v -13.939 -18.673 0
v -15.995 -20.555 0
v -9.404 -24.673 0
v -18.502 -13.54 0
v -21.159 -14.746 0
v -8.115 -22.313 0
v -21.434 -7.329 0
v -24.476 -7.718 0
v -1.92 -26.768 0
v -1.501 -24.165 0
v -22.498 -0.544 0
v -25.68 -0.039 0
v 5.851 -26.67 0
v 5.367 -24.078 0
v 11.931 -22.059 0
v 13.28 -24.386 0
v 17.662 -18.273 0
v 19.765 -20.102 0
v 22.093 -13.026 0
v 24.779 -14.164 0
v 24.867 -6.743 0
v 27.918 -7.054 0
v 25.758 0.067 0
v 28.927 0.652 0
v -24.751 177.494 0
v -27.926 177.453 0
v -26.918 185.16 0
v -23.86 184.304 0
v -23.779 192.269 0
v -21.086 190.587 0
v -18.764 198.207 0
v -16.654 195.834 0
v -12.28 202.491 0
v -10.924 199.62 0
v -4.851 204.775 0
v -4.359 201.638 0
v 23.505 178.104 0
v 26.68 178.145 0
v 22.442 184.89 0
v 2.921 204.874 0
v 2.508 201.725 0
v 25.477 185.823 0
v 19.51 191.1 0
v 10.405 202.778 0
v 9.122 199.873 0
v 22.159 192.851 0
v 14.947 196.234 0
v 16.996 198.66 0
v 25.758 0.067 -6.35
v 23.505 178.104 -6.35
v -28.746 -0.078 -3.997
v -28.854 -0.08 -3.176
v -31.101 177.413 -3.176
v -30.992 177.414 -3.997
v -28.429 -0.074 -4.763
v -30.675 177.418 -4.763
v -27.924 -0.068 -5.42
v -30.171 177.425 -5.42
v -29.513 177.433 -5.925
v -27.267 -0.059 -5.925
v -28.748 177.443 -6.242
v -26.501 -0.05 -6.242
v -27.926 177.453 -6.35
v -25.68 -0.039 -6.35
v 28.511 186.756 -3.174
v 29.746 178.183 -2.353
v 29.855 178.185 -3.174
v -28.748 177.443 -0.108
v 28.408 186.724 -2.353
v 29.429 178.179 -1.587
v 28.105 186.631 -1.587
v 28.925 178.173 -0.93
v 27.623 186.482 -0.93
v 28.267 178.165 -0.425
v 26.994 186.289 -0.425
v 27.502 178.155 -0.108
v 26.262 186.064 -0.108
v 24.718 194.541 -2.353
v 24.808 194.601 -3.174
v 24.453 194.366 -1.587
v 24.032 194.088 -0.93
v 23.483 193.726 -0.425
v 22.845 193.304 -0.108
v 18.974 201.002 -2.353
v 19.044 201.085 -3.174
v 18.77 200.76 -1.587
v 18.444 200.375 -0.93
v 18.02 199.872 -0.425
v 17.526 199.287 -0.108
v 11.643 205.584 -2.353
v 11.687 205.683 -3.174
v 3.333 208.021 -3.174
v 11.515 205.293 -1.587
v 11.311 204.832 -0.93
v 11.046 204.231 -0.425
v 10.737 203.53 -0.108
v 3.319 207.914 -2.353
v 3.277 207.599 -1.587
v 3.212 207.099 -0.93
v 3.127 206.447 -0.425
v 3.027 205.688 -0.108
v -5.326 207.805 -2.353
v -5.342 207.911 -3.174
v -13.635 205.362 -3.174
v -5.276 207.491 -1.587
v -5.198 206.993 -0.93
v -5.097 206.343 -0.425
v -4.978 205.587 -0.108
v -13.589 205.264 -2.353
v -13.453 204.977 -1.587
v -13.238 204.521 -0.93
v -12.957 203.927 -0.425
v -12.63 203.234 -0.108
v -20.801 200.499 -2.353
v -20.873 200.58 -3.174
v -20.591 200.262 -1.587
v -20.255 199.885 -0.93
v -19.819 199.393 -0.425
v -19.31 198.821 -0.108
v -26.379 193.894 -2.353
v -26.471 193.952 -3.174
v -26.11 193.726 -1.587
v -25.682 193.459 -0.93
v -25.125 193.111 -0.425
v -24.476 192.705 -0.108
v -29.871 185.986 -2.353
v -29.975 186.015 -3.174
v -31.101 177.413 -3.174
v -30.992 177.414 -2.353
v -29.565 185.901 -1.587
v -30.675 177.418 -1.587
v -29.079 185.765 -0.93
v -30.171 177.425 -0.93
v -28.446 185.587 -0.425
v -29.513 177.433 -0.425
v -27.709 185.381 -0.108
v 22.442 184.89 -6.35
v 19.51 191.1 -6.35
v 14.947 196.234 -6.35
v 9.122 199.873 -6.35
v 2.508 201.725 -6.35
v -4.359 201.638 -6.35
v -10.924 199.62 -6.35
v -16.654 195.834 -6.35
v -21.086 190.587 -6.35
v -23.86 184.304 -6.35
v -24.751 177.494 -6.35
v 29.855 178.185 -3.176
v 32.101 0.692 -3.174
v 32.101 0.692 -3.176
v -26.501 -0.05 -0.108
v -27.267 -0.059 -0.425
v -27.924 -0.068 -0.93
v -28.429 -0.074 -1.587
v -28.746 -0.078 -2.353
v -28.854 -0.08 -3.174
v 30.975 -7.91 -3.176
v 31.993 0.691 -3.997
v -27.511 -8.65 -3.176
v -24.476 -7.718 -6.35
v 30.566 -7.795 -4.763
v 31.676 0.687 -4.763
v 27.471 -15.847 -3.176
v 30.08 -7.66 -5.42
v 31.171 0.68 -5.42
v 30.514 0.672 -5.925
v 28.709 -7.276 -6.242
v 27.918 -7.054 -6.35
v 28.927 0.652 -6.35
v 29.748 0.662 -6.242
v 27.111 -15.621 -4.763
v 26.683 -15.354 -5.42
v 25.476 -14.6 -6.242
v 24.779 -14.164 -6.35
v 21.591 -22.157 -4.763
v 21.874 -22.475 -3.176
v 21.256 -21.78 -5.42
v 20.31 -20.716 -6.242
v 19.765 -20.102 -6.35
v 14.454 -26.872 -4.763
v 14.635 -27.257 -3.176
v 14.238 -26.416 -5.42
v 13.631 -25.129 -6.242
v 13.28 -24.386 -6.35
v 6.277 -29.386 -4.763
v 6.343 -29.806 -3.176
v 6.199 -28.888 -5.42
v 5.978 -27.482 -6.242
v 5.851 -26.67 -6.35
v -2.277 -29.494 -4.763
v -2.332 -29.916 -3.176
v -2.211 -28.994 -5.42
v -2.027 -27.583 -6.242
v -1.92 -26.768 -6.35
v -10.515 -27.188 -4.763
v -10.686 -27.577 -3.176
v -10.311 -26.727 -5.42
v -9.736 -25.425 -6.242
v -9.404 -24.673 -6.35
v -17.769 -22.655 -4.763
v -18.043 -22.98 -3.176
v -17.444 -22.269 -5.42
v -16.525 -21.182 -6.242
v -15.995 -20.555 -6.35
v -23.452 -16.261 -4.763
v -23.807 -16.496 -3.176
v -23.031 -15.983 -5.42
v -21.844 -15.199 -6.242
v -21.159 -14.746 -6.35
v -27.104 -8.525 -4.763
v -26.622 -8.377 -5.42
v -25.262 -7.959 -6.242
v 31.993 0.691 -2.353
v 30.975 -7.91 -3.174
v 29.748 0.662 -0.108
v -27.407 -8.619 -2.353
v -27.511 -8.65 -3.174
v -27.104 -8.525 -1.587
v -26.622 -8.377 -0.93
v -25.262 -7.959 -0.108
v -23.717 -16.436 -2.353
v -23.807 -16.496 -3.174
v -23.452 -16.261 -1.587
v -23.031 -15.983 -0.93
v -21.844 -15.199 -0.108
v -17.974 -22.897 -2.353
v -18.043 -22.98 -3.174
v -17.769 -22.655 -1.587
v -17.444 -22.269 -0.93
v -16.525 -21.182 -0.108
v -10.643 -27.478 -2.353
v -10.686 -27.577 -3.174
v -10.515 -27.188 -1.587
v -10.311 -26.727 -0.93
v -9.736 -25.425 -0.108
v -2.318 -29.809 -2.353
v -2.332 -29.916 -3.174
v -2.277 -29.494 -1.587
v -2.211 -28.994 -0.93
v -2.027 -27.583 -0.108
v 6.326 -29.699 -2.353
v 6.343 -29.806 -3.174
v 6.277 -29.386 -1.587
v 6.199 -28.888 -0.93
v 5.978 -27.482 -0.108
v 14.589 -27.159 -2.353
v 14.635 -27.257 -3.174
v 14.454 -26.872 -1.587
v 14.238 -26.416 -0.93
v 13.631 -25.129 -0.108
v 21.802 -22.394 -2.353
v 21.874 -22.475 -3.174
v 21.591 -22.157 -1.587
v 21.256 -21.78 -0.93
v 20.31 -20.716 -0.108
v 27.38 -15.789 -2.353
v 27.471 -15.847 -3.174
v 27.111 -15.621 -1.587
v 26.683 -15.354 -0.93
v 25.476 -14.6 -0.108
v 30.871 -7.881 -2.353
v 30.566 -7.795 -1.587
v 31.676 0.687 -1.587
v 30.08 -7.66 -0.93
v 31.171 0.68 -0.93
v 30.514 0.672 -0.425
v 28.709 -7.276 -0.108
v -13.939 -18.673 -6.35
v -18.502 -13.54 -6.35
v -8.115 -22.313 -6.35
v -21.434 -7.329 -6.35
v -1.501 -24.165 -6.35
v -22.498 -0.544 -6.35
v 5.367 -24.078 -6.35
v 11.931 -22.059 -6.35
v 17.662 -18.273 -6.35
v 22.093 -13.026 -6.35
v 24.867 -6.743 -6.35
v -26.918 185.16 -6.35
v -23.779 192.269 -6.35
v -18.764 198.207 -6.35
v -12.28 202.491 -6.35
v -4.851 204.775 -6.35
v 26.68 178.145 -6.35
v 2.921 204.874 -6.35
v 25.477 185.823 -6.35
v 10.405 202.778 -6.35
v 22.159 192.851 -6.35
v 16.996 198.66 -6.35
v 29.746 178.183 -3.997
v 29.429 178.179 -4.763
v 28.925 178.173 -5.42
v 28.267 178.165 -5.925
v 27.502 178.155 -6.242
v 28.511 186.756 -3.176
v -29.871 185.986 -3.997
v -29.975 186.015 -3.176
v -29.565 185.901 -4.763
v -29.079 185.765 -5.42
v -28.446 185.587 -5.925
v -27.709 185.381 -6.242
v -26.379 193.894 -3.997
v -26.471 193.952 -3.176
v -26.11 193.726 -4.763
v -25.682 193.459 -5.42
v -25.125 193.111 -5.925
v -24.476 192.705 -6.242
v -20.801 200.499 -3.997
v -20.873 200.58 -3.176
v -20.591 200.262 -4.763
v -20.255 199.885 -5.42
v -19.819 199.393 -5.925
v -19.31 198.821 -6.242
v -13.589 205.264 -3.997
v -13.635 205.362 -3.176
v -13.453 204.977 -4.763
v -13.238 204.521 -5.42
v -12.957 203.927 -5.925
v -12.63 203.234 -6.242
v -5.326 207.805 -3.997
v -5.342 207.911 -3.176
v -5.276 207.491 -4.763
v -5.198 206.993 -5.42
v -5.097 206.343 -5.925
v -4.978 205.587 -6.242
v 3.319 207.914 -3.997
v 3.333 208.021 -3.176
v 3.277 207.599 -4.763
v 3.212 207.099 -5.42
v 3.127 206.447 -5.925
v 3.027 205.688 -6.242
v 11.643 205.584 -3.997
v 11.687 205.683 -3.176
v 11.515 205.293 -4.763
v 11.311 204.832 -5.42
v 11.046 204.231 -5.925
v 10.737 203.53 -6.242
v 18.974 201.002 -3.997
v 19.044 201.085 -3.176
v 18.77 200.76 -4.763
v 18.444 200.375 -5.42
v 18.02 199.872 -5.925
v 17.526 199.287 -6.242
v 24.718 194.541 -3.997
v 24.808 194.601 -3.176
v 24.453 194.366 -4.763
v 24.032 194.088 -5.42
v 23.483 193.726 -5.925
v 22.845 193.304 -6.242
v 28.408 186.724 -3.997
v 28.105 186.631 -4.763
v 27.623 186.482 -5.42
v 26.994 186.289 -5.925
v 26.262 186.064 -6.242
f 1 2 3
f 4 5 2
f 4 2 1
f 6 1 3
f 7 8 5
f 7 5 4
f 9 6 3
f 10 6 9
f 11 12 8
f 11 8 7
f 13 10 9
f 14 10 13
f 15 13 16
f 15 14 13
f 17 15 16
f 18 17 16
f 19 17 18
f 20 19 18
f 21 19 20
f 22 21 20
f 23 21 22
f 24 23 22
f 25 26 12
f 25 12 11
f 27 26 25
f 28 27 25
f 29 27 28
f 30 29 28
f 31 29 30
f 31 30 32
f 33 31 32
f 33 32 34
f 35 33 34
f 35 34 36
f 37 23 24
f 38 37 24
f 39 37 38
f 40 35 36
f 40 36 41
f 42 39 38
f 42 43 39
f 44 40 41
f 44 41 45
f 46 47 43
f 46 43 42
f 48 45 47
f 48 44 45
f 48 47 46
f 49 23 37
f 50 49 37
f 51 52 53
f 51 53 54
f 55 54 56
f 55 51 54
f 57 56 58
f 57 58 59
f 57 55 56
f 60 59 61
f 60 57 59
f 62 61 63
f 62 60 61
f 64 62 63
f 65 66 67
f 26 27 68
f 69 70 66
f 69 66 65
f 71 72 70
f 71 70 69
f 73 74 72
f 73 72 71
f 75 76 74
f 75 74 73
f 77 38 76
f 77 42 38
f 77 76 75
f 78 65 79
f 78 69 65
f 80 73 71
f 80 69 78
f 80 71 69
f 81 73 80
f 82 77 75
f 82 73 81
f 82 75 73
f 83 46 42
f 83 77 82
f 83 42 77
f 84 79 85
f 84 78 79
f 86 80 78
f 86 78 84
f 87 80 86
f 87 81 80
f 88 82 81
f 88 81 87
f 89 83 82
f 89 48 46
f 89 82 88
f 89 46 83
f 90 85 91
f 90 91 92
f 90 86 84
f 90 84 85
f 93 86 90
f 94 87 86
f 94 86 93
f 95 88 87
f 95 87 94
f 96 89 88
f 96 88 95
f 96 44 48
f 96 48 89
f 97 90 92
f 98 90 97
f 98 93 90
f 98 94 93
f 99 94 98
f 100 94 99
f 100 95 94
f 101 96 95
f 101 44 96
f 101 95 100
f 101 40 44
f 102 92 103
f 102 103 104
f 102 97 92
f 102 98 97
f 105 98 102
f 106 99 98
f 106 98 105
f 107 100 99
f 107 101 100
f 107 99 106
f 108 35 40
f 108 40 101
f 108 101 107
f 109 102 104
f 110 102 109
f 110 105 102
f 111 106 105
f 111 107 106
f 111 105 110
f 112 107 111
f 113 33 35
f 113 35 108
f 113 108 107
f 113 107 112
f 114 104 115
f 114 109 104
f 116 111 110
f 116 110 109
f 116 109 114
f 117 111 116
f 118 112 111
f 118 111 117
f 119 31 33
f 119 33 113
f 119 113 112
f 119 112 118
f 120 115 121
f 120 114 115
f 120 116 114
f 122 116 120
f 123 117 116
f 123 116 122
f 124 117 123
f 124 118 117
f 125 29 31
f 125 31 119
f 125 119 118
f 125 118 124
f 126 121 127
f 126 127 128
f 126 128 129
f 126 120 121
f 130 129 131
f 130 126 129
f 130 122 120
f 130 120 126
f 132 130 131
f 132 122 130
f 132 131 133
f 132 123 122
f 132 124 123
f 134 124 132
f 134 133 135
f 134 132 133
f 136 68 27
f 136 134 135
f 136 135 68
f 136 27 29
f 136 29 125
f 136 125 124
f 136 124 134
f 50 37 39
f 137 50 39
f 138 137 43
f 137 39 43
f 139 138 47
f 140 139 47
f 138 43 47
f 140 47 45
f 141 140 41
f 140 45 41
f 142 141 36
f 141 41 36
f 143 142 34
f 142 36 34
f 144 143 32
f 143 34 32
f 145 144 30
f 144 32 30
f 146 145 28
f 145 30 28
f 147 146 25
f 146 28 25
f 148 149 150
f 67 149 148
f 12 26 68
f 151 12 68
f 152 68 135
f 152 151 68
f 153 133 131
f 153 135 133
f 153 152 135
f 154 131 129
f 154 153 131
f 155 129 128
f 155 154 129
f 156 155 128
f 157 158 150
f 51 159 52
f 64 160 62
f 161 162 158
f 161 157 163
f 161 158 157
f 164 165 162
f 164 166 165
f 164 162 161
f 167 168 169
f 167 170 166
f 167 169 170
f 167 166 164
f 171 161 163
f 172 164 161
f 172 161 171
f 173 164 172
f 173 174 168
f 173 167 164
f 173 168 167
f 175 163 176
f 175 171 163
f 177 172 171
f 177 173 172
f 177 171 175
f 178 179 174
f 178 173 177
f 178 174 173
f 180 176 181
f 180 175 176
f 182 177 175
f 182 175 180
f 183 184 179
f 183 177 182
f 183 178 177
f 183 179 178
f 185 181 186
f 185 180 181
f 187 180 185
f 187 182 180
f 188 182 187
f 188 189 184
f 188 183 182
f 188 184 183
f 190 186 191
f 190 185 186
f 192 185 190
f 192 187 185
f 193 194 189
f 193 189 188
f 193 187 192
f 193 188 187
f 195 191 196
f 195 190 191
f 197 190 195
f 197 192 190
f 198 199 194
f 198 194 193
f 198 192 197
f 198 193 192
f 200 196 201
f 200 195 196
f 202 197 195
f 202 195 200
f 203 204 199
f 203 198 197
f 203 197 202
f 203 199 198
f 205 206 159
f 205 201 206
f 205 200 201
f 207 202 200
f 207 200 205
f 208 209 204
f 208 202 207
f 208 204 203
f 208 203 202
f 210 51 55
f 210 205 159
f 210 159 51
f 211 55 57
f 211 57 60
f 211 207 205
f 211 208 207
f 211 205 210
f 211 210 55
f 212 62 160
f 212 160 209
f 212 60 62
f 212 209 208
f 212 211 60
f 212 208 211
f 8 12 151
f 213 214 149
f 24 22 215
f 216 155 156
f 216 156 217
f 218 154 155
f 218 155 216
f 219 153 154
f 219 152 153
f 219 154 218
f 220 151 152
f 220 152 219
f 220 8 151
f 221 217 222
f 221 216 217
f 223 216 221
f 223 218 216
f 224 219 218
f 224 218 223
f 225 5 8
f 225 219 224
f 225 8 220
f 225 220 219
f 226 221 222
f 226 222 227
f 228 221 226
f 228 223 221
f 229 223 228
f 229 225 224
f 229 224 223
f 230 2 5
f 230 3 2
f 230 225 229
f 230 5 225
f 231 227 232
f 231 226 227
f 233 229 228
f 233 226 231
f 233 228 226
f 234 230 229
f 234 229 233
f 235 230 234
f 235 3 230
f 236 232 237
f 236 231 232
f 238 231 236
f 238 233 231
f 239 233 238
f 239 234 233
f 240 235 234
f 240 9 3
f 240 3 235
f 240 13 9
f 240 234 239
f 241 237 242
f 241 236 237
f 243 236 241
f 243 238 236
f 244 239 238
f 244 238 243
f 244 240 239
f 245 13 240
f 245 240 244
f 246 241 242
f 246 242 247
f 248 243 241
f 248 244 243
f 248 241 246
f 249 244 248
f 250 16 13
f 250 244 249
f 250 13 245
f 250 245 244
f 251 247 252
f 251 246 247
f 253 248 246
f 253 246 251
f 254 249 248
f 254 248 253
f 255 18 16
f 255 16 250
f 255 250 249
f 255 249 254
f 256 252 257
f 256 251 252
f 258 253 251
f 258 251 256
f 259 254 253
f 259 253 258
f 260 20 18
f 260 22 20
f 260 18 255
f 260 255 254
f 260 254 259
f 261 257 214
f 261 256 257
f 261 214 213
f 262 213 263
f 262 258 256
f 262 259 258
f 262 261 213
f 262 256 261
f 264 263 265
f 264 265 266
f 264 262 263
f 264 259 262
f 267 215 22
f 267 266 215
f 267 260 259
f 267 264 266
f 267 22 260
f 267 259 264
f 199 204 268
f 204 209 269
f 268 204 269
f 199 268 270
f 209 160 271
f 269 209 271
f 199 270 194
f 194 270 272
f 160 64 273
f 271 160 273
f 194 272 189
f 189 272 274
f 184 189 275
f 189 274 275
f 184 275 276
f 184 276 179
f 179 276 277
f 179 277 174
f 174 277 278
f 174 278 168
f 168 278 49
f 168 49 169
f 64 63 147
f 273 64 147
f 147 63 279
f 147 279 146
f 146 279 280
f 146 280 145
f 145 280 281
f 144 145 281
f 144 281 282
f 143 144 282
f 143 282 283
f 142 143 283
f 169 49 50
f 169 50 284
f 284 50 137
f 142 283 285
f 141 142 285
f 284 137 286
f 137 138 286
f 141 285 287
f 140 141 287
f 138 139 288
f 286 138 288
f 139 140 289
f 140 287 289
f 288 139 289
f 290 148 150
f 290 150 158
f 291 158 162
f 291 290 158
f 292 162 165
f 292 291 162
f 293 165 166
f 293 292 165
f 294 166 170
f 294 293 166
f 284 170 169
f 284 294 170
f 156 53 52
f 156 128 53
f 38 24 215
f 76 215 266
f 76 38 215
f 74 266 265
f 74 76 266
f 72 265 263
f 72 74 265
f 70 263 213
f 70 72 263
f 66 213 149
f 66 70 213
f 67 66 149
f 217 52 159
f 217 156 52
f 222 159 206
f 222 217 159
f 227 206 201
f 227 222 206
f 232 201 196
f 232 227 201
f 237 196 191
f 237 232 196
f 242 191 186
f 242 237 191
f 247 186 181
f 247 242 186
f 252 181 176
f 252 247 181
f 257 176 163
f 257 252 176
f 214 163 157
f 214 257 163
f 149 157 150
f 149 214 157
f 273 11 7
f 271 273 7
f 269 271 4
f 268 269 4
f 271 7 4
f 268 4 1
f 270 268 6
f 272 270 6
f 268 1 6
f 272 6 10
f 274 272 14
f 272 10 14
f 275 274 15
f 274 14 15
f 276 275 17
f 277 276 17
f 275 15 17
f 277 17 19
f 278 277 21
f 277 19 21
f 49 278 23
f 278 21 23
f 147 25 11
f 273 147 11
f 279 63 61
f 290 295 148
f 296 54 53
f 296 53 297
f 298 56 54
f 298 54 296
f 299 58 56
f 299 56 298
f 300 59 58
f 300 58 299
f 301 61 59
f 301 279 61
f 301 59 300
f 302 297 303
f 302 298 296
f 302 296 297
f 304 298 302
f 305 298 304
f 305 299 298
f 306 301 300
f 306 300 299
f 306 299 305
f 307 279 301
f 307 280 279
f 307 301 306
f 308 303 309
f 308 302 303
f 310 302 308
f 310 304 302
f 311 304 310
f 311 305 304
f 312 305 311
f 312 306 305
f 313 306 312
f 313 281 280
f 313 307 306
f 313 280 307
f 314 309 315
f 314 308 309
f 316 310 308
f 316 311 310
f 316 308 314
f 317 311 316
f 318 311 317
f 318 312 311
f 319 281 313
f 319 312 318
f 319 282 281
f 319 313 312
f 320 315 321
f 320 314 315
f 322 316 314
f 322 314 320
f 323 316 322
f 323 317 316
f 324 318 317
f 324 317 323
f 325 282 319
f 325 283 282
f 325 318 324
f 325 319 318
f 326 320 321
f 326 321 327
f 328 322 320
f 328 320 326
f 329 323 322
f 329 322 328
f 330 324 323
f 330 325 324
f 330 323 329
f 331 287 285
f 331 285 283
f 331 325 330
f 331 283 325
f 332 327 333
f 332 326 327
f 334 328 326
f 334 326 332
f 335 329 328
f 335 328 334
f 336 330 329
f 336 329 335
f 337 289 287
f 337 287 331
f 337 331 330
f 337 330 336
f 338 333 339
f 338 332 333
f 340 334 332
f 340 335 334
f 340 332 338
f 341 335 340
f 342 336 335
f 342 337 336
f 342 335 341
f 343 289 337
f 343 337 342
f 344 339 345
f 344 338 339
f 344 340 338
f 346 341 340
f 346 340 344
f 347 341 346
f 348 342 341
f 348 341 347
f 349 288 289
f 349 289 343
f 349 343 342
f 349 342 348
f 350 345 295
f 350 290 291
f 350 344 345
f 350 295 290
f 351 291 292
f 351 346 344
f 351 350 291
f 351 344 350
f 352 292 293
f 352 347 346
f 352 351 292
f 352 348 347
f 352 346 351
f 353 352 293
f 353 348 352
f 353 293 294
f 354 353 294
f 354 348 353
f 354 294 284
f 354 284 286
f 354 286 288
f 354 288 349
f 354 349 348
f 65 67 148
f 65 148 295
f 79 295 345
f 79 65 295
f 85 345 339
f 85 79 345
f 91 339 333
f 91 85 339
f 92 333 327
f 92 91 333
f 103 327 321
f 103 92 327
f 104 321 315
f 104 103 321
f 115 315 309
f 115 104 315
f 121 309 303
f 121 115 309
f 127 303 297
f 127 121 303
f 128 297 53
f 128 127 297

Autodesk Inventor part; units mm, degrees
ref_plane "YZ Plane" through (0, 0, 0) normal (1, 0, 0) x (0, 1, 0)
ref_plane "XZ Plane" through (0, 0, 0) normal (0, 1, 0) x (-1, 0, 0)
ref_plane "XY Plane" through (0, 0, 0) normal (0, 0, 1) x (1, 0, 0)
sketch "Sketch1" plane through (0, 0, 0) normal (0, 0, 1) x (1, 0, 0)
  line L0 (25.7585, 0.0668) -> (23.5051, 178.1043)
  line L1 (-24.7511, 177.4935) -> (-22.4976, -0.544)
  line L2 (32.1011, 0.692) -> (29.8546, 178.1847)
  line L3 (-31.1006, 177.4131) -> (-28.854, -0.0795)
  arc A0 (29.8546, 178.1847) -> (-31.1006, 177.4131) centre (-0.623, 177.7989) ccw
  arc A1 (-28.854, -0.0795) -> (32.1011, 0.692) centre (1.6236, 0.3063) ccw
  arc A2 (-22.4976, -0.544) -> (25.7585, 0.0668) centre (1.6305, -0.2386) ccw
  arc A3 (23.5051, 178.1043) -> (-24.7511, 177.4935) centre (-0.623, 177.7989) ccw
  point P0 (0, 0)
  dimension "d6" = 6.35
  dimension "d7" = 6.35
  dimension "d11" = 177.8
  dimension "d12" = 177.8
  dimension "d13" = 24.13
extrude "Extrusion1" add sketch "Sketch1" against normal blind 6.35
fillet "Fillet1" radius 3.175 8 edges at (30.9778, 89.4384, 0) (-1.0088, 208.2765, 0) (-29.9773, 88.6668, 0) (2.0093, -30.1713, 0) (30.9778, 89.4384, -6.35) (-1.0088, 208.2765, -6.35) (-29.9773, 88.6668, -6.35) (2.0093, -30.1713, -6.35)
properties part number "7in polycord loop"
